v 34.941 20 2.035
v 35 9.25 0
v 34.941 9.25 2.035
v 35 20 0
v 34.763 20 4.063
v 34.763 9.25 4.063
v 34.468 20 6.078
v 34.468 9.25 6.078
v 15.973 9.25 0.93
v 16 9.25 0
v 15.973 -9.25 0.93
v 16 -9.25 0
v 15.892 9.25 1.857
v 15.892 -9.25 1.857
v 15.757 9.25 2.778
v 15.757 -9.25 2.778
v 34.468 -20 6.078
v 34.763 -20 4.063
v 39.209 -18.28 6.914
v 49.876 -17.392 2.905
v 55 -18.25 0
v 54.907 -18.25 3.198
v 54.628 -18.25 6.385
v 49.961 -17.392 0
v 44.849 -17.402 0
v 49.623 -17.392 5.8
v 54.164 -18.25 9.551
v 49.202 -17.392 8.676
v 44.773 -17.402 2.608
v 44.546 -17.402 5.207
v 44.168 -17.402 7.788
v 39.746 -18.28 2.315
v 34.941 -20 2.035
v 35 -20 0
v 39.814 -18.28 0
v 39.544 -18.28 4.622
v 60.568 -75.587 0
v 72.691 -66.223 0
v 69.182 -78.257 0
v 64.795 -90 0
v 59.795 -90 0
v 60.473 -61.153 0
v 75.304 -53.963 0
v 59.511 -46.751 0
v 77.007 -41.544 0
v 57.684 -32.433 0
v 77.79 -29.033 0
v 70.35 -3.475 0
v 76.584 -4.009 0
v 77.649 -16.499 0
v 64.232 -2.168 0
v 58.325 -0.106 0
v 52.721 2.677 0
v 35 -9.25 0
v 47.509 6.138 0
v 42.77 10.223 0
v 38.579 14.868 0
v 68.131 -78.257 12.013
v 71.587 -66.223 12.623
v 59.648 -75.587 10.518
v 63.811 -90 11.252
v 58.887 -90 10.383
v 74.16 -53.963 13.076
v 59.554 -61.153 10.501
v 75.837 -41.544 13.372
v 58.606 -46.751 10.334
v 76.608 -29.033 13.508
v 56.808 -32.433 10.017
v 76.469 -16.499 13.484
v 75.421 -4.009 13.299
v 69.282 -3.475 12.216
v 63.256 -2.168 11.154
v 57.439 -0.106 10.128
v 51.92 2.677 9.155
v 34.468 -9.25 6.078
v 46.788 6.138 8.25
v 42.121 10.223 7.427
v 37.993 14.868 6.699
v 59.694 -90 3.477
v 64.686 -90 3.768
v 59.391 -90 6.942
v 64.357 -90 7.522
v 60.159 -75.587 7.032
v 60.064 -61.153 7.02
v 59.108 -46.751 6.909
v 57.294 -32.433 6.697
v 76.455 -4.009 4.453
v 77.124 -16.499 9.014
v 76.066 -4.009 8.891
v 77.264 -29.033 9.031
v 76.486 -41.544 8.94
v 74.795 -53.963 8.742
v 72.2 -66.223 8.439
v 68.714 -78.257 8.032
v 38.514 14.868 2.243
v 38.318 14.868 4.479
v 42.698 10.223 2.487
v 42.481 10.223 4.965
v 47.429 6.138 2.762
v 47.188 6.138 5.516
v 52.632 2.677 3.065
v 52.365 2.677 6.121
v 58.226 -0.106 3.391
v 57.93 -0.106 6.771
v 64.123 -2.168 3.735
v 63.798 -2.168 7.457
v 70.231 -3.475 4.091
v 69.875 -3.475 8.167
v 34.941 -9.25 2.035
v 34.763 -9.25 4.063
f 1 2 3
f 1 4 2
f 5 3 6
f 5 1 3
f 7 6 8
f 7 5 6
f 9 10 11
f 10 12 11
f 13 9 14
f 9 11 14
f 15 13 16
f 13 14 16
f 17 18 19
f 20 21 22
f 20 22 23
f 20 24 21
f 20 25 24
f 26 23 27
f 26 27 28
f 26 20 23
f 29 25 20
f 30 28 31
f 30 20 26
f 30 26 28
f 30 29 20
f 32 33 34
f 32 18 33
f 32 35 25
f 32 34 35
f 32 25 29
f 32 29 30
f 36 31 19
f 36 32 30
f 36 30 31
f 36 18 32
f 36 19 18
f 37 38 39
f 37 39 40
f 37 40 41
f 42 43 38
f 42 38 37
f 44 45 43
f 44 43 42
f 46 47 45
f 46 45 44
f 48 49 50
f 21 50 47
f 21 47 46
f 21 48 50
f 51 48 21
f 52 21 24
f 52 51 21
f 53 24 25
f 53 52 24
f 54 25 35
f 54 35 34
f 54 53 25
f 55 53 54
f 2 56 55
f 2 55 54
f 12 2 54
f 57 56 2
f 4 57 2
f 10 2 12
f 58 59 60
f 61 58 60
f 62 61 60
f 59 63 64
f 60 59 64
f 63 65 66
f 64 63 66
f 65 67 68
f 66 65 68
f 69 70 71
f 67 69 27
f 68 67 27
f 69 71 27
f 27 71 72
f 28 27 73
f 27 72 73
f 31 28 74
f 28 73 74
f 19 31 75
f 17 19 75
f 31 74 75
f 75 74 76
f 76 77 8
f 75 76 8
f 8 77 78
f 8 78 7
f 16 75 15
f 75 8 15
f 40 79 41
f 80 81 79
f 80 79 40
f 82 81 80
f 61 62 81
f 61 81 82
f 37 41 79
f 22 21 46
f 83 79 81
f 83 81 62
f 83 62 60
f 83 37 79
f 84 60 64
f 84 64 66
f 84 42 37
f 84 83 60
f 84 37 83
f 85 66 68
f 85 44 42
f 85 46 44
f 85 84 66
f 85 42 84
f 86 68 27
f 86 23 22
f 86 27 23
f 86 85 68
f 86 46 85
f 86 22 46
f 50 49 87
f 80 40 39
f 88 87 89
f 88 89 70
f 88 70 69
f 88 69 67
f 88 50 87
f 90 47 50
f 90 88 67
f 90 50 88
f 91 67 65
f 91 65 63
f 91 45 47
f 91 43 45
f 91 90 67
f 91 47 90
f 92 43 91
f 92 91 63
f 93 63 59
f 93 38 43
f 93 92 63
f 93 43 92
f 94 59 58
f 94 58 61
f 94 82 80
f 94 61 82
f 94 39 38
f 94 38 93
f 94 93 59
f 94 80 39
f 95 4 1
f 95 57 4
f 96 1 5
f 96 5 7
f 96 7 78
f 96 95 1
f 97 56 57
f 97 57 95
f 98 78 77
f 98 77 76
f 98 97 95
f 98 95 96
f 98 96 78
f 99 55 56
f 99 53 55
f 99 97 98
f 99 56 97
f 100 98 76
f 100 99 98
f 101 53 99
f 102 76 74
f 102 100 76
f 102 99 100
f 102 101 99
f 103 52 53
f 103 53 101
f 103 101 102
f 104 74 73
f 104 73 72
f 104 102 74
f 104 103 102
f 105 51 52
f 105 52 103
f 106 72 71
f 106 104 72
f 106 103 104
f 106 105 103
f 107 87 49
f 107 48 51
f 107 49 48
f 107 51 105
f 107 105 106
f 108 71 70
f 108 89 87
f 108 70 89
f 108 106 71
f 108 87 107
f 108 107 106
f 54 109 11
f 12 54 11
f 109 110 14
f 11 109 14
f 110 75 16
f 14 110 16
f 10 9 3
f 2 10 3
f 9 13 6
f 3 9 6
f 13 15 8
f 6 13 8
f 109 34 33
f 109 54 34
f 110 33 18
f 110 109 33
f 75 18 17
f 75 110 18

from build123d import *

# Parameters (mm, degrees)
REVOLVE1_ANGLE = 10


with BuildPart() as part:
    # Sketch2 → Revolve1 (revolve)
    with BuildSketch(Plane.XY):
        with BuildLine():
            ThreePointArc((55, -18.250226729), (44.849284803, -17.402430783), (35, -20))
            Line((35, -20), (35, 20))
            ThreePointArc((35, 20), (52.721414573, 2.677196604), (76.584109665, -4.008596909))
            ThreePointArc((76.584109665, -4.008596909), (76.270130447, -47.769342724), (64.795242944, -90))
            Line((64.795242944, -90), (59.795242944, -90))
            ThreePointArc((59.795242944, -90), (60.100118063, -53.944497774), (55, -18.250226729))
        make_face()
        Polygon((16, -9.25), (35, -9.25), (35, 9.25), (16, 9.25), (16, 0), align=None)
    revolve(axis=Axis((0, 0, 0), (0, -1, 0)), revolution_arc=REVOLVE1_ANGLE)


solid = part.part
